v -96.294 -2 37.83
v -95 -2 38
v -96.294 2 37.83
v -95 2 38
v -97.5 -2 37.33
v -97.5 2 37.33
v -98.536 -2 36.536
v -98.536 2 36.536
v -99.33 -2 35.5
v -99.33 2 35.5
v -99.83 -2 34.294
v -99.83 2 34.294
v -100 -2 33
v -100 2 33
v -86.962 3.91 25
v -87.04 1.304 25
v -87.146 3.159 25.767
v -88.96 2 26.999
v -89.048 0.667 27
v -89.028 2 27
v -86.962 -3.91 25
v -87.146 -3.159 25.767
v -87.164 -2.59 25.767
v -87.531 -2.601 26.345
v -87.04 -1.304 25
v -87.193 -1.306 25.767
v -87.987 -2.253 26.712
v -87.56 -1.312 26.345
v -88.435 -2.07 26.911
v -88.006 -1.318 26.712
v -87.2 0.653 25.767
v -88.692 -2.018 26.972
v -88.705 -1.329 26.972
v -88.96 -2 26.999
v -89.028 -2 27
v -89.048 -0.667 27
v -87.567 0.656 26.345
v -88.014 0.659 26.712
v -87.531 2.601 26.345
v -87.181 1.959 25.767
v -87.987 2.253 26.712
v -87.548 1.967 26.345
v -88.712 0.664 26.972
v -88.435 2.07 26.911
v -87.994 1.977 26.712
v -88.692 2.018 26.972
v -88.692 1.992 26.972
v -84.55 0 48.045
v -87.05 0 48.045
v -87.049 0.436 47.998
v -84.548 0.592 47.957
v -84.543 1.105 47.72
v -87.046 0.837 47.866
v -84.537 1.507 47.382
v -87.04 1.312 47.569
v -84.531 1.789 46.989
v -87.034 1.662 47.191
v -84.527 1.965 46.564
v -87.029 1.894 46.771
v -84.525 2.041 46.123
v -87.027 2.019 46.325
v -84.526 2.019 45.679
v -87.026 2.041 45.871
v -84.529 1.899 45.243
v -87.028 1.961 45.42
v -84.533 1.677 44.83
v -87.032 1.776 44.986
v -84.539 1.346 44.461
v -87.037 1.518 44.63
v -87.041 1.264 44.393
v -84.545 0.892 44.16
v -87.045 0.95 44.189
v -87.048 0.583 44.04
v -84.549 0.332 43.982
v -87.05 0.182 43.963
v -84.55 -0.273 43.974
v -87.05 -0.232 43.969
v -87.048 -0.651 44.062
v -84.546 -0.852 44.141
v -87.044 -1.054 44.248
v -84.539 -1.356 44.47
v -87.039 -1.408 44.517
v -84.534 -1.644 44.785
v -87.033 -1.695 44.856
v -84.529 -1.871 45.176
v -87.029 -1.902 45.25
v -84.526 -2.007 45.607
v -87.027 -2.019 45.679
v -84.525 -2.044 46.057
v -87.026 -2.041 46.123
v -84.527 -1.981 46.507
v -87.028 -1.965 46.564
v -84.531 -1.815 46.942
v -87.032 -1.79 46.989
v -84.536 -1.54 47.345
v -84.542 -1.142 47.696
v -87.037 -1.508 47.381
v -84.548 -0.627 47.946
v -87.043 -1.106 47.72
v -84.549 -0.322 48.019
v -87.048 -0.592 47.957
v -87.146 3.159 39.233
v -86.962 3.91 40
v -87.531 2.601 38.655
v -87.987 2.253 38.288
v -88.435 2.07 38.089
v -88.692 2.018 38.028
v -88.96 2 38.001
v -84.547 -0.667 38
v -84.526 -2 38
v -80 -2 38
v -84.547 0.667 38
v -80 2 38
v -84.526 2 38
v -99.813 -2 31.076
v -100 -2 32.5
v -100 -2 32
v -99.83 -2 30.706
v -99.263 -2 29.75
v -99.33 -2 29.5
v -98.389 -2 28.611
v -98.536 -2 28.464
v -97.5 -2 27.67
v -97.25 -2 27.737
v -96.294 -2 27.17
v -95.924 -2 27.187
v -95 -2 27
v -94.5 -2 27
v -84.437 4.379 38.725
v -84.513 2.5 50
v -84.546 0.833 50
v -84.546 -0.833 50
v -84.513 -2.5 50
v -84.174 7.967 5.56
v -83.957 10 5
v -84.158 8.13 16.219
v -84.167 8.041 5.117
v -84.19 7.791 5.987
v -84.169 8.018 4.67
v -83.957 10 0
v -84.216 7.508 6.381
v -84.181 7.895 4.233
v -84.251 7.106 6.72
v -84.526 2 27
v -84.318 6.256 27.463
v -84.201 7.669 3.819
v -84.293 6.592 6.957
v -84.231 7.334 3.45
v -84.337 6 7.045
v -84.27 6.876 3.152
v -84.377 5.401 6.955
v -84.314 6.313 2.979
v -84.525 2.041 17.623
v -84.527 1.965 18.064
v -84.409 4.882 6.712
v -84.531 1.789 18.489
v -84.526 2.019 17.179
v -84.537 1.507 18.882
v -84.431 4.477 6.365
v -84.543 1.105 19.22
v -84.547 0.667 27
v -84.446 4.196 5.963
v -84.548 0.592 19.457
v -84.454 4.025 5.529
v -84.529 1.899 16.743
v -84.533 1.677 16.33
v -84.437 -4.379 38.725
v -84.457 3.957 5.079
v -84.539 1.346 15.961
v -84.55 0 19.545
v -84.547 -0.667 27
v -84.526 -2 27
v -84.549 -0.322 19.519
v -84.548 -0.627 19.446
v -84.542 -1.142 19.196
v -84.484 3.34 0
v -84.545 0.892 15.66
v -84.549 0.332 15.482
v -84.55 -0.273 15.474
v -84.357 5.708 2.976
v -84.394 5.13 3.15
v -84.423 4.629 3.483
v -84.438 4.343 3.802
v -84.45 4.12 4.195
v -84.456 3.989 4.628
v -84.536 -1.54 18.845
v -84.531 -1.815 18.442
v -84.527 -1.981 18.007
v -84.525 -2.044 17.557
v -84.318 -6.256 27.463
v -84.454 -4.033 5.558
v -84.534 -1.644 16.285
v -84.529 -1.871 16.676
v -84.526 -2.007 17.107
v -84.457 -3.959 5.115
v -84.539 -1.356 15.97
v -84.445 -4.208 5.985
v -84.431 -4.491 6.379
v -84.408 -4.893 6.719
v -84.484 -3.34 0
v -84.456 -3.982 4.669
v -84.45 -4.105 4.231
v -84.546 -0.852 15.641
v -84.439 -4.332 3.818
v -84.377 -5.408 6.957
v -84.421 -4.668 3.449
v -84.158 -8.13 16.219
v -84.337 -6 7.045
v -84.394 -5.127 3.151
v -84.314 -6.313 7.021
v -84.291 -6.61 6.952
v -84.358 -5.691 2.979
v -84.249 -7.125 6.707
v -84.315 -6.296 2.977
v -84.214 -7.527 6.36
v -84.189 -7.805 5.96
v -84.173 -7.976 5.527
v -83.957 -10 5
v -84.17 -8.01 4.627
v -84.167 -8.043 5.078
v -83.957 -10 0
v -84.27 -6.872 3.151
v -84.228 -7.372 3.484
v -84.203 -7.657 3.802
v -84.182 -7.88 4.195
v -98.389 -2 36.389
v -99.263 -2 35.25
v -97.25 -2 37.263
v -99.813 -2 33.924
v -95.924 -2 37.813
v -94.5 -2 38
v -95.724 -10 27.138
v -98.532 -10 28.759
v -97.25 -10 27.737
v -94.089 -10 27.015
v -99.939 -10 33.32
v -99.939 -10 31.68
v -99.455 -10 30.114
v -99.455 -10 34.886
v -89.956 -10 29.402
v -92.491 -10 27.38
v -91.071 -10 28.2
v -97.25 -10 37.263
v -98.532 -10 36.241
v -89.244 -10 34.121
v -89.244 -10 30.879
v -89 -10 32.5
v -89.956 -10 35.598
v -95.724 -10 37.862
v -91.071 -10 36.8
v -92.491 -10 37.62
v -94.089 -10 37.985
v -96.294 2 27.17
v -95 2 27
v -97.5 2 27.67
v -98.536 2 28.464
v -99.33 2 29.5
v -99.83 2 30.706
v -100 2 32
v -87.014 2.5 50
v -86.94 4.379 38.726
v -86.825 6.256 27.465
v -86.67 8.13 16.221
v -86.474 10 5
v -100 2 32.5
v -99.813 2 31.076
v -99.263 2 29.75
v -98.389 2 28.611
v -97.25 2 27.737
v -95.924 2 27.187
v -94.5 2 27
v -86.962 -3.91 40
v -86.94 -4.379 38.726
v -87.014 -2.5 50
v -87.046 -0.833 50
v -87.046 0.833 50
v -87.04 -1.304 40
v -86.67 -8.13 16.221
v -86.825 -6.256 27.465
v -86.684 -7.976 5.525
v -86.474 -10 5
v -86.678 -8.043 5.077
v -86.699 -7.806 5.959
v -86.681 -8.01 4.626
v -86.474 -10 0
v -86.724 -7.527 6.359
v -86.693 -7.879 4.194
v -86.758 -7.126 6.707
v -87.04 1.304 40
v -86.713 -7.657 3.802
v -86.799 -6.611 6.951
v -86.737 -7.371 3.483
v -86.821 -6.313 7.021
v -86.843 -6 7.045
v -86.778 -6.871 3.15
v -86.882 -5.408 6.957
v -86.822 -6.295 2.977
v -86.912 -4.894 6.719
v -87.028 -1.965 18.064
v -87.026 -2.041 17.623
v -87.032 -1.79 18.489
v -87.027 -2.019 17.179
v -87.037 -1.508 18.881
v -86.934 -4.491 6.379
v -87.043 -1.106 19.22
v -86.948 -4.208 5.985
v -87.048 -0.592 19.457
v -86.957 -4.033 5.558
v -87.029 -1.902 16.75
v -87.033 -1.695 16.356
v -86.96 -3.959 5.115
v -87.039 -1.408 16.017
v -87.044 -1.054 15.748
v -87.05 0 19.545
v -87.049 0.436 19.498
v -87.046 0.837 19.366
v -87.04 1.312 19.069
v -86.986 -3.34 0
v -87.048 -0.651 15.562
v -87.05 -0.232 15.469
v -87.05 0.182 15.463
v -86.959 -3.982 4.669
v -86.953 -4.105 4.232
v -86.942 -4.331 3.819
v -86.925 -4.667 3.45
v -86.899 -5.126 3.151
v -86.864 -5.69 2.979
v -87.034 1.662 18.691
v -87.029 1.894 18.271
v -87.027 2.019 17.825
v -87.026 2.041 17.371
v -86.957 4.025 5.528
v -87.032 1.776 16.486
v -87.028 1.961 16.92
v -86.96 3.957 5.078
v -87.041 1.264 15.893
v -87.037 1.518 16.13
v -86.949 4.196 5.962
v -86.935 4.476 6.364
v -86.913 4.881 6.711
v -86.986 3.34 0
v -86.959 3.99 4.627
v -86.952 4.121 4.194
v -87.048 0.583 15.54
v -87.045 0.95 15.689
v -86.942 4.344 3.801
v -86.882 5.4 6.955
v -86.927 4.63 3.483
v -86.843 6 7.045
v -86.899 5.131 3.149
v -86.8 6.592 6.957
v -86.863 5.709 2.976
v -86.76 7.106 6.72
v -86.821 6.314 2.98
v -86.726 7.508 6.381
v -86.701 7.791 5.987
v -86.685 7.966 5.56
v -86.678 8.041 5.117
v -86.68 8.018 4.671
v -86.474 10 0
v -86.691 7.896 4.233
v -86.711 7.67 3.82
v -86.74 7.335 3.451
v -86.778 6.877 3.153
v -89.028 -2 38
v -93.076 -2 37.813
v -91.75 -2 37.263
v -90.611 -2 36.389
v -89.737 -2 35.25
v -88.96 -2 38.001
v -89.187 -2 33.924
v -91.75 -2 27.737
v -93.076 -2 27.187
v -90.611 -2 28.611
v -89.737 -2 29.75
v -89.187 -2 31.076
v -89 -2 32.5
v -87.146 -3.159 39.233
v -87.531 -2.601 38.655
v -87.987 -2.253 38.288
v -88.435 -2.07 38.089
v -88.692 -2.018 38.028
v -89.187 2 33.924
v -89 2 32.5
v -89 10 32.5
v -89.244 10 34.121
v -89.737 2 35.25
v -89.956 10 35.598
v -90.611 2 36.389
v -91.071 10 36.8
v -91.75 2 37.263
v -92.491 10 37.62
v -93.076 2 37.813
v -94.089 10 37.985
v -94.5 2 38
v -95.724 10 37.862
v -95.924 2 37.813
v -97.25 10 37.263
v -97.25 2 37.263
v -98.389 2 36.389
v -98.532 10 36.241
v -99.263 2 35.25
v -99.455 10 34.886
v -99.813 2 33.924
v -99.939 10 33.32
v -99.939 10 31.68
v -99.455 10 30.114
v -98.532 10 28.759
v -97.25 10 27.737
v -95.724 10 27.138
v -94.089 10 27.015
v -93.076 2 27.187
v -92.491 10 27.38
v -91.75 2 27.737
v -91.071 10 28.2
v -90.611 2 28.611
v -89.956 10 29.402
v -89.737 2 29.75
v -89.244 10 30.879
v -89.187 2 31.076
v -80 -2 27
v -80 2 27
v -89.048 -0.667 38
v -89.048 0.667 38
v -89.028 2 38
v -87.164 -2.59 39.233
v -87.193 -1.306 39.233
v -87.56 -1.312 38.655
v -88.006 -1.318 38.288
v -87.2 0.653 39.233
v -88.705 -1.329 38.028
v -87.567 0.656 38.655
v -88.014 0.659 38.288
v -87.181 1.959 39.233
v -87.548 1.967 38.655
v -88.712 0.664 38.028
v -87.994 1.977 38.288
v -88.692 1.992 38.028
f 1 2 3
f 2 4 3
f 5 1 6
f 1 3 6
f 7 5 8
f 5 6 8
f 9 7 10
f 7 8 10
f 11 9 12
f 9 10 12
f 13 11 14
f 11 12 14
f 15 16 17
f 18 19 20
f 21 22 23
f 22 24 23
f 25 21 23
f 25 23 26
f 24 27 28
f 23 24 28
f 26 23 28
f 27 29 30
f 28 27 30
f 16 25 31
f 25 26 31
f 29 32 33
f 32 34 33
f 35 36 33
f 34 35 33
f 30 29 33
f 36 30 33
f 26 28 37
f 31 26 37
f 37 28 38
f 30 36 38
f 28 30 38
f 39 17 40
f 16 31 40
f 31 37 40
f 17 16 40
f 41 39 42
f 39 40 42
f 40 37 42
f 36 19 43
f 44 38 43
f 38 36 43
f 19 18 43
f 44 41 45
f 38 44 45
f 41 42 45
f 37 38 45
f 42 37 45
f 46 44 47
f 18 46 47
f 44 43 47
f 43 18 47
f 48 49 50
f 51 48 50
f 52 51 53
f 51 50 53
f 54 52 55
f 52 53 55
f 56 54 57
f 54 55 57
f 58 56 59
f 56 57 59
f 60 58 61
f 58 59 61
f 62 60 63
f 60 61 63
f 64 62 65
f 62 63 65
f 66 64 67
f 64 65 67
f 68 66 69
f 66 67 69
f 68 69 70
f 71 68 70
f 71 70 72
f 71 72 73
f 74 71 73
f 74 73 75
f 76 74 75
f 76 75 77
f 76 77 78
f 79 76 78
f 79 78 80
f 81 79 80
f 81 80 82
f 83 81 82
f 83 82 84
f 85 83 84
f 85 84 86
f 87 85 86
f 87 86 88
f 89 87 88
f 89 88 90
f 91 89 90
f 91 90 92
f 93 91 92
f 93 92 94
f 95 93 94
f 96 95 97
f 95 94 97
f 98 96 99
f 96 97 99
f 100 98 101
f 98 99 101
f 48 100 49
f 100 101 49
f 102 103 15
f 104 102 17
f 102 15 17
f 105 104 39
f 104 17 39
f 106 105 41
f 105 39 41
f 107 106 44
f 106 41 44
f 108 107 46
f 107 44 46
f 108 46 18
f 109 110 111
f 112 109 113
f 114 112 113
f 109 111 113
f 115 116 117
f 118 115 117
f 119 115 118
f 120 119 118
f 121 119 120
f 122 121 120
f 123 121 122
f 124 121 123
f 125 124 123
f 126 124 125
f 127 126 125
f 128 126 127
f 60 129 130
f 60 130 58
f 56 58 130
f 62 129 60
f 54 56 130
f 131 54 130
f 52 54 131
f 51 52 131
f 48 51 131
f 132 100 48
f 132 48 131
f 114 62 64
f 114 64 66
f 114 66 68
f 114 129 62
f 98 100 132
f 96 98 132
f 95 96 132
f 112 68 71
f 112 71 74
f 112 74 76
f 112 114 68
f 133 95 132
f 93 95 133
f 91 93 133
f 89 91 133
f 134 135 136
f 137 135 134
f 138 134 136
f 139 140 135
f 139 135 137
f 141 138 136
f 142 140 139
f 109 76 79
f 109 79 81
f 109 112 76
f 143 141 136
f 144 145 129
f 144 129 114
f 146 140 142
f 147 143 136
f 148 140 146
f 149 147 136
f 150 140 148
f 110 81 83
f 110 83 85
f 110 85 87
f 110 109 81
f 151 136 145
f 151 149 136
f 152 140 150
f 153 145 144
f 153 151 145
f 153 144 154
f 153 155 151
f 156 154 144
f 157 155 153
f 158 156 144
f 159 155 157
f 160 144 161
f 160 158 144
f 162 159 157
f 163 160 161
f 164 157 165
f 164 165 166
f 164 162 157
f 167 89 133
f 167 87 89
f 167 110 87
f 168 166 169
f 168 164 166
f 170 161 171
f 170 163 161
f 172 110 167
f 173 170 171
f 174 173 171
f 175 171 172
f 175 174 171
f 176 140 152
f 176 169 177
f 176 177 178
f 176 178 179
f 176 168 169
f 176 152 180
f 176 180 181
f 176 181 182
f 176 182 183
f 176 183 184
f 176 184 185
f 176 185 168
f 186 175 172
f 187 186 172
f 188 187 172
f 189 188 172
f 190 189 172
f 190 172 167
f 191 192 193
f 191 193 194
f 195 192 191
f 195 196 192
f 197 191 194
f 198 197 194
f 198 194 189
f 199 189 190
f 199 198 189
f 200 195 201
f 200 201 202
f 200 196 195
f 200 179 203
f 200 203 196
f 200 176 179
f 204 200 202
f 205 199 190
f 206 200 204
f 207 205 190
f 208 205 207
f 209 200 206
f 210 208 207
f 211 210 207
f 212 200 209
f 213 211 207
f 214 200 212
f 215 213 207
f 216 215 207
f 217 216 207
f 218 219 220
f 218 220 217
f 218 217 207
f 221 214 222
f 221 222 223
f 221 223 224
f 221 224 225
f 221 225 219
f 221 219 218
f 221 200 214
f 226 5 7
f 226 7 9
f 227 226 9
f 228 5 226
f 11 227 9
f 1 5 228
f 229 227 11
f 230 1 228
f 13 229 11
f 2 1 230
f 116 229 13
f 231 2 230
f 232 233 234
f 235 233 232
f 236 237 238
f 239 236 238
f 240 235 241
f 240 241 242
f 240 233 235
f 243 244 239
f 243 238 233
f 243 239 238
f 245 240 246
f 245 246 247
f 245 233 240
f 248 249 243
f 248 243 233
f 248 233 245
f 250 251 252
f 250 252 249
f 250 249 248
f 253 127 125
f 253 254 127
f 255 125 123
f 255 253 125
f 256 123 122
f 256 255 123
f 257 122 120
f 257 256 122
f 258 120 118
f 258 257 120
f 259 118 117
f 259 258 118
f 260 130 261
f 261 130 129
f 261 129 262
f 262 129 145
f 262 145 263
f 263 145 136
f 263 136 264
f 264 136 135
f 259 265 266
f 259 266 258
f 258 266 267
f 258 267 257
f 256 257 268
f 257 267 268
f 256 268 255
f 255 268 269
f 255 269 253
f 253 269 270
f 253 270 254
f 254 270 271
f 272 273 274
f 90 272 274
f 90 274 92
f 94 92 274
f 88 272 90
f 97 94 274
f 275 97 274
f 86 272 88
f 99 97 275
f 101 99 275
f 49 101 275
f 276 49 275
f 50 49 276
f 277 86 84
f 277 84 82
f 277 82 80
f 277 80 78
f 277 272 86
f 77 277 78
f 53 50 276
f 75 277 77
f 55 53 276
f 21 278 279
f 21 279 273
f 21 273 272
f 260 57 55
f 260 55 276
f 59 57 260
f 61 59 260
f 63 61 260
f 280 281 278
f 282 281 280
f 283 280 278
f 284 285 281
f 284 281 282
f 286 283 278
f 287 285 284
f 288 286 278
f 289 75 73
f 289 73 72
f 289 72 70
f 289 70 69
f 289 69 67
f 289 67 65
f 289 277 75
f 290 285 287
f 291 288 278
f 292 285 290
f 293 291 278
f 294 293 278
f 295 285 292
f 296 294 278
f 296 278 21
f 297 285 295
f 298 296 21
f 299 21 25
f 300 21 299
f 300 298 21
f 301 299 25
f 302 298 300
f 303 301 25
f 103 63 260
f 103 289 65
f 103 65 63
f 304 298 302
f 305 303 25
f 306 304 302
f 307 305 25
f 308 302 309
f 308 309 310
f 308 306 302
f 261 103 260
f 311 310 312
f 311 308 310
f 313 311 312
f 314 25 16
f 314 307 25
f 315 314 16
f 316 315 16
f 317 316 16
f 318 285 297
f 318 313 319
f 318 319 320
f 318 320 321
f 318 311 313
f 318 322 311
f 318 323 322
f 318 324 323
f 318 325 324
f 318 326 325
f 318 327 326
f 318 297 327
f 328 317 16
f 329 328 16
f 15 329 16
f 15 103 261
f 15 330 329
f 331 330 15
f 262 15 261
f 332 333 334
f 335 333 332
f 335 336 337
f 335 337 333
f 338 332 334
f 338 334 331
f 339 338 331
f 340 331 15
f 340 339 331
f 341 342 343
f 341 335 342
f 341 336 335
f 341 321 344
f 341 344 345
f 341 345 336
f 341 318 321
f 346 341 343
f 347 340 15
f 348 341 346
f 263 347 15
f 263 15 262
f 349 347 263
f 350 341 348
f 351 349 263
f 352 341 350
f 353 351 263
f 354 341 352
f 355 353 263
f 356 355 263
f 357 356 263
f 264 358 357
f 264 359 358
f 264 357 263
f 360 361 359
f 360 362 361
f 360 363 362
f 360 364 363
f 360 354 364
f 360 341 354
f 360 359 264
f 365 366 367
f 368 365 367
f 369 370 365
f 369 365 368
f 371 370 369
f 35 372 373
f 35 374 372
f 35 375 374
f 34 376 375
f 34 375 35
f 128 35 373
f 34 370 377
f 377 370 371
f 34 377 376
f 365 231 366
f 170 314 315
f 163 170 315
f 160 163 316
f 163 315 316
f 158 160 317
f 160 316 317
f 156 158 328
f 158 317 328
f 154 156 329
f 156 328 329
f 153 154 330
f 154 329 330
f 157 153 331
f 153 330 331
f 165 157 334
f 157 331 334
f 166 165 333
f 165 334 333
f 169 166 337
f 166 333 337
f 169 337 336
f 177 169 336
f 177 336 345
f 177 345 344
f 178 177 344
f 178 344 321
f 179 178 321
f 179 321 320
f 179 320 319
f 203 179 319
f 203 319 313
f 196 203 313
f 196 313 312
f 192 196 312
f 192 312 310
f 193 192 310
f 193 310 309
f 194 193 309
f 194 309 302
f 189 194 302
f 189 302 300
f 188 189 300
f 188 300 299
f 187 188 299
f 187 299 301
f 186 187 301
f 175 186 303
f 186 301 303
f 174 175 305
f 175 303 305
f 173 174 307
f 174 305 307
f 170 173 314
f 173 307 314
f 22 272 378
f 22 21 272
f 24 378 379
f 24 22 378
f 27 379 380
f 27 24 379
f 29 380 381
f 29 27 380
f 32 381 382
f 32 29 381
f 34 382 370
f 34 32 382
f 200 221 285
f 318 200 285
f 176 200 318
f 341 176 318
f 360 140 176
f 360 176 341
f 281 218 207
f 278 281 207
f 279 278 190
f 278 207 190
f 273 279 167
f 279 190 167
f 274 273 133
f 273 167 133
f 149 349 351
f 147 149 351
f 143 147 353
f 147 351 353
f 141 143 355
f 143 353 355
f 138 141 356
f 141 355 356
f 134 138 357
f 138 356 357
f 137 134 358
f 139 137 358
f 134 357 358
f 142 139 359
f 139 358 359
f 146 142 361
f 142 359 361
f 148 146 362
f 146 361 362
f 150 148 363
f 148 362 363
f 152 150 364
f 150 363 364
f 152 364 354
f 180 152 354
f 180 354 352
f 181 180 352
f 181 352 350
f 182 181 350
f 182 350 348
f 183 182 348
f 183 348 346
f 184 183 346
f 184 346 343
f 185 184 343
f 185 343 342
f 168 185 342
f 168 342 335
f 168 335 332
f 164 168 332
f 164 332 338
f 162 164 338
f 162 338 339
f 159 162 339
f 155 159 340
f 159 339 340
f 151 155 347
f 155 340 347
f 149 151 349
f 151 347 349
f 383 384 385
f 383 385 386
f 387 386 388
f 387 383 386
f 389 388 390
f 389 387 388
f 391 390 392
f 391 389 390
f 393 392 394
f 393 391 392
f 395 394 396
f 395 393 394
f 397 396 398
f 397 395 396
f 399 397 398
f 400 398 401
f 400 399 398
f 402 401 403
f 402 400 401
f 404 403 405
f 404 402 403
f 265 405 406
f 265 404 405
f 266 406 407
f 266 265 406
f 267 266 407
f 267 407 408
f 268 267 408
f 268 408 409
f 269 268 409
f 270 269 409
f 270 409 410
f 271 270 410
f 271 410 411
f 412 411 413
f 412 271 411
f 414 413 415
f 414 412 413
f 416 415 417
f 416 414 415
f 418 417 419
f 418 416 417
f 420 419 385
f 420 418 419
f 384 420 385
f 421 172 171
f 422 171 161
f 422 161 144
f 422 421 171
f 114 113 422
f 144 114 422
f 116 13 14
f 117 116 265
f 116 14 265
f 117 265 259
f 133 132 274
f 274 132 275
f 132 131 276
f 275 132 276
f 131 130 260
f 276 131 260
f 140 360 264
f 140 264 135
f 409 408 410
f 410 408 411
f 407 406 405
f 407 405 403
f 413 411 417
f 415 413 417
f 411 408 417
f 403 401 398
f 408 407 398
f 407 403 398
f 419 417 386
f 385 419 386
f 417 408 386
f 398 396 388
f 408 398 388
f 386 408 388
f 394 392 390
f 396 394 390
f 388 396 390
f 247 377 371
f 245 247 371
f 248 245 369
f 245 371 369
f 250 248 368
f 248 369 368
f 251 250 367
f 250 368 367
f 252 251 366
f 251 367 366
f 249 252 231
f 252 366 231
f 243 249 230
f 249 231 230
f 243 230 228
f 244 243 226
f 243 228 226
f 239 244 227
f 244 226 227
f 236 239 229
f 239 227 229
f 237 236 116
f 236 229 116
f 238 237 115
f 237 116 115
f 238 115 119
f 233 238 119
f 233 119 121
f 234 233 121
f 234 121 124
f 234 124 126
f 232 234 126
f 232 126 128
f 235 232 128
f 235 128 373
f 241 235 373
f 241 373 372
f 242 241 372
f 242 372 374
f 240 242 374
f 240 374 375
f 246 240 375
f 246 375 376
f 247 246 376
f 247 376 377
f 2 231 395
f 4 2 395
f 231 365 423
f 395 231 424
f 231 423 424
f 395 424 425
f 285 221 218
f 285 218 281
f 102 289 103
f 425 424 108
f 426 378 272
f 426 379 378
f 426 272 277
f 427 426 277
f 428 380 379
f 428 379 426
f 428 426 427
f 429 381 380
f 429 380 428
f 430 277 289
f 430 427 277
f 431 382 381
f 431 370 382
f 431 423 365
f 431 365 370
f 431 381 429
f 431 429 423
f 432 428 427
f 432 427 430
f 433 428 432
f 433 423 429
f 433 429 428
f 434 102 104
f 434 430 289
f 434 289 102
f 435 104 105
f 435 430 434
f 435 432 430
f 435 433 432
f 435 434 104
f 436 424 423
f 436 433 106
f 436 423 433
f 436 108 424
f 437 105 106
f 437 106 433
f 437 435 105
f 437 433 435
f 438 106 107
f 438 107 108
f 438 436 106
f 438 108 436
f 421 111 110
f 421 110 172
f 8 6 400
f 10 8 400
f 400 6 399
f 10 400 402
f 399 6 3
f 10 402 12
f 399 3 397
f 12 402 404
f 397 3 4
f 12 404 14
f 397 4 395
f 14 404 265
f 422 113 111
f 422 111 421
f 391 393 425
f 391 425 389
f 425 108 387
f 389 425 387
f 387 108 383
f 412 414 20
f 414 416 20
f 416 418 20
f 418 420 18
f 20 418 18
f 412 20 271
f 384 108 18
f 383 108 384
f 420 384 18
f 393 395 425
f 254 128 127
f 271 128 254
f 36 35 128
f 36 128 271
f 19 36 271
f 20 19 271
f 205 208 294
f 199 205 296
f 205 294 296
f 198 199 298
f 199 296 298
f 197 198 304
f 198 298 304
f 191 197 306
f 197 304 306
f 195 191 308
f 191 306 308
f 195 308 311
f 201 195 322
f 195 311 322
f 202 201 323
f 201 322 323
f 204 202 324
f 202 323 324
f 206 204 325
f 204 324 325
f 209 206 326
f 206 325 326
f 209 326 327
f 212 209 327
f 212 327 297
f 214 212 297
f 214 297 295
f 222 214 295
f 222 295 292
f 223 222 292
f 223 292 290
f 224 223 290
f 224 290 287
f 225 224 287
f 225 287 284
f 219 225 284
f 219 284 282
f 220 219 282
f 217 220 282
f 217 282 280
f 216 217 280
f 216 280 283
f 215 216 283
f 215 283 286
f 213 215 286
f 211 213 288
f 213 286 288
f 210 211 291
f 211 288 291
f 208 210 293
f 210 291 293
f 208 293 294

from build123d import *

# Parameters (mm, degrees)
BOSS_EXTRUDE1_DEPTH             = 50
SKETCH2_W                       = 109.146932236
SKETCH2_H                       = 60.735636093
CUT_EXTRUDE1_DEPTH              = 88.05
F_20_0_161_DIAMETER_HOLE1_D     = 4.0894
F_20_0_161_DIAMETER_HOLE1_DEPTH = 87.05
SKETCH7_W                       = 11
SKETCH7_H                       = 4
BOSS_EXTRUDE2_DEPTH             = 20
FILLET1_R                       = 2
SKETCH8_R                       = 5.5
BOSS_EXTRUDE3_DEPTH             = 8
BOSS_EXTRUDE3_DEPTH_BACK        = 12
FILLET2_R                       = 5


with BuildPart() as part:
    # Sketch1 → Boss-Extrude1 (new body)
    with BuildSketch(Plane.XY):
        with BuildLine():
            Line((-86.473709878, 10), (-83.956551263, 10))
            ThreePointArc((-83.956551263, 10), (-84.55, 0), (-83.956551263, -10))
            Line((-83.956551263, -10), (-86.473709878, -10))
            ThreePointArc((-86.473709878, -10), (-87.05, 0), (-86.473709878, 10))
        make_face()
    extrude(amount=BOSS_EXTRUDE1_DEPTH)

    # Sketch2 → Cut-Extrude1 (cut, through all)
    with BuildSketch(Plane(origin=(0, 0, 0), x_dir=(0, 0, -1), z_dir=(1, 0, 0))):
        with Locations((-34.220207601, -2.682367057)):
            Rectangle(SKETCH2_W, SKETCH2_H)
        Polygon((0, 10), (0, -10), (-5, -10), (-50, -2.5), (-50, 2.5), (-5, 10), align=None, mode=Mode.SUBTRACT)
    extrude(amount=-CUT_EXTRUDE1_DEPTH, mode=Mode.SUBTRACT)

    # #20 (0.161) Diameter Hole1
    with Locations(Plane(origin=(0, 0, 0), x_dir=(0, 0, -1), z_dir=(1, 0, 0))):
        with Locations((-46, 0), (-5, 6), (-5, -6), (-17.5, 0)):
            Hole(F_20_0_161_DIAMETER_HOLE1_D / 2, depth=F_20_0_161_DIAMETER_HOLE1_DEPTH)

    # Sketch7 → Boss-Extrude2 (add)
    with BuildSketch(Plane(origin=(-80, 0, -87.99983), x_dir=(0, 0, -1), z_dir=(1, 0, 0))):
        with Locations((-120.49983, 0)):
            Rectangle(SKETCH7_W, SKETCH7_H)
    extrude(amount=-BOSS_EXTRUDE2_DEPTH)

    # Fillet1
    fillet1_edges = [part.edges().sort_by_distance(p)[0] for p in [
        (-87.027021666, -2, 32.5),
        (-87.05, 0, 27),
        (-87.027021666, 2, 32.5),
        (-87.05, 0, 38),
    ]]
    fillet(fillet1_edges, radius=FILLET1_R)

    # Sketch8 → Boss-Extrude3 (add, two sides)
    with BuildSketch(Plane.XZ.offset(2)) as boss_extrude3_sk:
        with Locations((-94.5, 32.5)):
            Circle(SKETCH8_R)
    extrude(amount=BOSS_EXTRUDE3_DEPTH)
    extrude(boss_extrude3_sk.sketch, amount=-BOSS_EXTRUDE3_DEPTH_BACK)

    # Fillet2
    fillet2_edges = [part.edges().sort_by_distance(p)[0] for p in [
        (-100, 0, 38),
        (-100, 0, 27),
    ]]
    fillet(fillet2_edges, radius=FILLET2_R)


solid = part.part
